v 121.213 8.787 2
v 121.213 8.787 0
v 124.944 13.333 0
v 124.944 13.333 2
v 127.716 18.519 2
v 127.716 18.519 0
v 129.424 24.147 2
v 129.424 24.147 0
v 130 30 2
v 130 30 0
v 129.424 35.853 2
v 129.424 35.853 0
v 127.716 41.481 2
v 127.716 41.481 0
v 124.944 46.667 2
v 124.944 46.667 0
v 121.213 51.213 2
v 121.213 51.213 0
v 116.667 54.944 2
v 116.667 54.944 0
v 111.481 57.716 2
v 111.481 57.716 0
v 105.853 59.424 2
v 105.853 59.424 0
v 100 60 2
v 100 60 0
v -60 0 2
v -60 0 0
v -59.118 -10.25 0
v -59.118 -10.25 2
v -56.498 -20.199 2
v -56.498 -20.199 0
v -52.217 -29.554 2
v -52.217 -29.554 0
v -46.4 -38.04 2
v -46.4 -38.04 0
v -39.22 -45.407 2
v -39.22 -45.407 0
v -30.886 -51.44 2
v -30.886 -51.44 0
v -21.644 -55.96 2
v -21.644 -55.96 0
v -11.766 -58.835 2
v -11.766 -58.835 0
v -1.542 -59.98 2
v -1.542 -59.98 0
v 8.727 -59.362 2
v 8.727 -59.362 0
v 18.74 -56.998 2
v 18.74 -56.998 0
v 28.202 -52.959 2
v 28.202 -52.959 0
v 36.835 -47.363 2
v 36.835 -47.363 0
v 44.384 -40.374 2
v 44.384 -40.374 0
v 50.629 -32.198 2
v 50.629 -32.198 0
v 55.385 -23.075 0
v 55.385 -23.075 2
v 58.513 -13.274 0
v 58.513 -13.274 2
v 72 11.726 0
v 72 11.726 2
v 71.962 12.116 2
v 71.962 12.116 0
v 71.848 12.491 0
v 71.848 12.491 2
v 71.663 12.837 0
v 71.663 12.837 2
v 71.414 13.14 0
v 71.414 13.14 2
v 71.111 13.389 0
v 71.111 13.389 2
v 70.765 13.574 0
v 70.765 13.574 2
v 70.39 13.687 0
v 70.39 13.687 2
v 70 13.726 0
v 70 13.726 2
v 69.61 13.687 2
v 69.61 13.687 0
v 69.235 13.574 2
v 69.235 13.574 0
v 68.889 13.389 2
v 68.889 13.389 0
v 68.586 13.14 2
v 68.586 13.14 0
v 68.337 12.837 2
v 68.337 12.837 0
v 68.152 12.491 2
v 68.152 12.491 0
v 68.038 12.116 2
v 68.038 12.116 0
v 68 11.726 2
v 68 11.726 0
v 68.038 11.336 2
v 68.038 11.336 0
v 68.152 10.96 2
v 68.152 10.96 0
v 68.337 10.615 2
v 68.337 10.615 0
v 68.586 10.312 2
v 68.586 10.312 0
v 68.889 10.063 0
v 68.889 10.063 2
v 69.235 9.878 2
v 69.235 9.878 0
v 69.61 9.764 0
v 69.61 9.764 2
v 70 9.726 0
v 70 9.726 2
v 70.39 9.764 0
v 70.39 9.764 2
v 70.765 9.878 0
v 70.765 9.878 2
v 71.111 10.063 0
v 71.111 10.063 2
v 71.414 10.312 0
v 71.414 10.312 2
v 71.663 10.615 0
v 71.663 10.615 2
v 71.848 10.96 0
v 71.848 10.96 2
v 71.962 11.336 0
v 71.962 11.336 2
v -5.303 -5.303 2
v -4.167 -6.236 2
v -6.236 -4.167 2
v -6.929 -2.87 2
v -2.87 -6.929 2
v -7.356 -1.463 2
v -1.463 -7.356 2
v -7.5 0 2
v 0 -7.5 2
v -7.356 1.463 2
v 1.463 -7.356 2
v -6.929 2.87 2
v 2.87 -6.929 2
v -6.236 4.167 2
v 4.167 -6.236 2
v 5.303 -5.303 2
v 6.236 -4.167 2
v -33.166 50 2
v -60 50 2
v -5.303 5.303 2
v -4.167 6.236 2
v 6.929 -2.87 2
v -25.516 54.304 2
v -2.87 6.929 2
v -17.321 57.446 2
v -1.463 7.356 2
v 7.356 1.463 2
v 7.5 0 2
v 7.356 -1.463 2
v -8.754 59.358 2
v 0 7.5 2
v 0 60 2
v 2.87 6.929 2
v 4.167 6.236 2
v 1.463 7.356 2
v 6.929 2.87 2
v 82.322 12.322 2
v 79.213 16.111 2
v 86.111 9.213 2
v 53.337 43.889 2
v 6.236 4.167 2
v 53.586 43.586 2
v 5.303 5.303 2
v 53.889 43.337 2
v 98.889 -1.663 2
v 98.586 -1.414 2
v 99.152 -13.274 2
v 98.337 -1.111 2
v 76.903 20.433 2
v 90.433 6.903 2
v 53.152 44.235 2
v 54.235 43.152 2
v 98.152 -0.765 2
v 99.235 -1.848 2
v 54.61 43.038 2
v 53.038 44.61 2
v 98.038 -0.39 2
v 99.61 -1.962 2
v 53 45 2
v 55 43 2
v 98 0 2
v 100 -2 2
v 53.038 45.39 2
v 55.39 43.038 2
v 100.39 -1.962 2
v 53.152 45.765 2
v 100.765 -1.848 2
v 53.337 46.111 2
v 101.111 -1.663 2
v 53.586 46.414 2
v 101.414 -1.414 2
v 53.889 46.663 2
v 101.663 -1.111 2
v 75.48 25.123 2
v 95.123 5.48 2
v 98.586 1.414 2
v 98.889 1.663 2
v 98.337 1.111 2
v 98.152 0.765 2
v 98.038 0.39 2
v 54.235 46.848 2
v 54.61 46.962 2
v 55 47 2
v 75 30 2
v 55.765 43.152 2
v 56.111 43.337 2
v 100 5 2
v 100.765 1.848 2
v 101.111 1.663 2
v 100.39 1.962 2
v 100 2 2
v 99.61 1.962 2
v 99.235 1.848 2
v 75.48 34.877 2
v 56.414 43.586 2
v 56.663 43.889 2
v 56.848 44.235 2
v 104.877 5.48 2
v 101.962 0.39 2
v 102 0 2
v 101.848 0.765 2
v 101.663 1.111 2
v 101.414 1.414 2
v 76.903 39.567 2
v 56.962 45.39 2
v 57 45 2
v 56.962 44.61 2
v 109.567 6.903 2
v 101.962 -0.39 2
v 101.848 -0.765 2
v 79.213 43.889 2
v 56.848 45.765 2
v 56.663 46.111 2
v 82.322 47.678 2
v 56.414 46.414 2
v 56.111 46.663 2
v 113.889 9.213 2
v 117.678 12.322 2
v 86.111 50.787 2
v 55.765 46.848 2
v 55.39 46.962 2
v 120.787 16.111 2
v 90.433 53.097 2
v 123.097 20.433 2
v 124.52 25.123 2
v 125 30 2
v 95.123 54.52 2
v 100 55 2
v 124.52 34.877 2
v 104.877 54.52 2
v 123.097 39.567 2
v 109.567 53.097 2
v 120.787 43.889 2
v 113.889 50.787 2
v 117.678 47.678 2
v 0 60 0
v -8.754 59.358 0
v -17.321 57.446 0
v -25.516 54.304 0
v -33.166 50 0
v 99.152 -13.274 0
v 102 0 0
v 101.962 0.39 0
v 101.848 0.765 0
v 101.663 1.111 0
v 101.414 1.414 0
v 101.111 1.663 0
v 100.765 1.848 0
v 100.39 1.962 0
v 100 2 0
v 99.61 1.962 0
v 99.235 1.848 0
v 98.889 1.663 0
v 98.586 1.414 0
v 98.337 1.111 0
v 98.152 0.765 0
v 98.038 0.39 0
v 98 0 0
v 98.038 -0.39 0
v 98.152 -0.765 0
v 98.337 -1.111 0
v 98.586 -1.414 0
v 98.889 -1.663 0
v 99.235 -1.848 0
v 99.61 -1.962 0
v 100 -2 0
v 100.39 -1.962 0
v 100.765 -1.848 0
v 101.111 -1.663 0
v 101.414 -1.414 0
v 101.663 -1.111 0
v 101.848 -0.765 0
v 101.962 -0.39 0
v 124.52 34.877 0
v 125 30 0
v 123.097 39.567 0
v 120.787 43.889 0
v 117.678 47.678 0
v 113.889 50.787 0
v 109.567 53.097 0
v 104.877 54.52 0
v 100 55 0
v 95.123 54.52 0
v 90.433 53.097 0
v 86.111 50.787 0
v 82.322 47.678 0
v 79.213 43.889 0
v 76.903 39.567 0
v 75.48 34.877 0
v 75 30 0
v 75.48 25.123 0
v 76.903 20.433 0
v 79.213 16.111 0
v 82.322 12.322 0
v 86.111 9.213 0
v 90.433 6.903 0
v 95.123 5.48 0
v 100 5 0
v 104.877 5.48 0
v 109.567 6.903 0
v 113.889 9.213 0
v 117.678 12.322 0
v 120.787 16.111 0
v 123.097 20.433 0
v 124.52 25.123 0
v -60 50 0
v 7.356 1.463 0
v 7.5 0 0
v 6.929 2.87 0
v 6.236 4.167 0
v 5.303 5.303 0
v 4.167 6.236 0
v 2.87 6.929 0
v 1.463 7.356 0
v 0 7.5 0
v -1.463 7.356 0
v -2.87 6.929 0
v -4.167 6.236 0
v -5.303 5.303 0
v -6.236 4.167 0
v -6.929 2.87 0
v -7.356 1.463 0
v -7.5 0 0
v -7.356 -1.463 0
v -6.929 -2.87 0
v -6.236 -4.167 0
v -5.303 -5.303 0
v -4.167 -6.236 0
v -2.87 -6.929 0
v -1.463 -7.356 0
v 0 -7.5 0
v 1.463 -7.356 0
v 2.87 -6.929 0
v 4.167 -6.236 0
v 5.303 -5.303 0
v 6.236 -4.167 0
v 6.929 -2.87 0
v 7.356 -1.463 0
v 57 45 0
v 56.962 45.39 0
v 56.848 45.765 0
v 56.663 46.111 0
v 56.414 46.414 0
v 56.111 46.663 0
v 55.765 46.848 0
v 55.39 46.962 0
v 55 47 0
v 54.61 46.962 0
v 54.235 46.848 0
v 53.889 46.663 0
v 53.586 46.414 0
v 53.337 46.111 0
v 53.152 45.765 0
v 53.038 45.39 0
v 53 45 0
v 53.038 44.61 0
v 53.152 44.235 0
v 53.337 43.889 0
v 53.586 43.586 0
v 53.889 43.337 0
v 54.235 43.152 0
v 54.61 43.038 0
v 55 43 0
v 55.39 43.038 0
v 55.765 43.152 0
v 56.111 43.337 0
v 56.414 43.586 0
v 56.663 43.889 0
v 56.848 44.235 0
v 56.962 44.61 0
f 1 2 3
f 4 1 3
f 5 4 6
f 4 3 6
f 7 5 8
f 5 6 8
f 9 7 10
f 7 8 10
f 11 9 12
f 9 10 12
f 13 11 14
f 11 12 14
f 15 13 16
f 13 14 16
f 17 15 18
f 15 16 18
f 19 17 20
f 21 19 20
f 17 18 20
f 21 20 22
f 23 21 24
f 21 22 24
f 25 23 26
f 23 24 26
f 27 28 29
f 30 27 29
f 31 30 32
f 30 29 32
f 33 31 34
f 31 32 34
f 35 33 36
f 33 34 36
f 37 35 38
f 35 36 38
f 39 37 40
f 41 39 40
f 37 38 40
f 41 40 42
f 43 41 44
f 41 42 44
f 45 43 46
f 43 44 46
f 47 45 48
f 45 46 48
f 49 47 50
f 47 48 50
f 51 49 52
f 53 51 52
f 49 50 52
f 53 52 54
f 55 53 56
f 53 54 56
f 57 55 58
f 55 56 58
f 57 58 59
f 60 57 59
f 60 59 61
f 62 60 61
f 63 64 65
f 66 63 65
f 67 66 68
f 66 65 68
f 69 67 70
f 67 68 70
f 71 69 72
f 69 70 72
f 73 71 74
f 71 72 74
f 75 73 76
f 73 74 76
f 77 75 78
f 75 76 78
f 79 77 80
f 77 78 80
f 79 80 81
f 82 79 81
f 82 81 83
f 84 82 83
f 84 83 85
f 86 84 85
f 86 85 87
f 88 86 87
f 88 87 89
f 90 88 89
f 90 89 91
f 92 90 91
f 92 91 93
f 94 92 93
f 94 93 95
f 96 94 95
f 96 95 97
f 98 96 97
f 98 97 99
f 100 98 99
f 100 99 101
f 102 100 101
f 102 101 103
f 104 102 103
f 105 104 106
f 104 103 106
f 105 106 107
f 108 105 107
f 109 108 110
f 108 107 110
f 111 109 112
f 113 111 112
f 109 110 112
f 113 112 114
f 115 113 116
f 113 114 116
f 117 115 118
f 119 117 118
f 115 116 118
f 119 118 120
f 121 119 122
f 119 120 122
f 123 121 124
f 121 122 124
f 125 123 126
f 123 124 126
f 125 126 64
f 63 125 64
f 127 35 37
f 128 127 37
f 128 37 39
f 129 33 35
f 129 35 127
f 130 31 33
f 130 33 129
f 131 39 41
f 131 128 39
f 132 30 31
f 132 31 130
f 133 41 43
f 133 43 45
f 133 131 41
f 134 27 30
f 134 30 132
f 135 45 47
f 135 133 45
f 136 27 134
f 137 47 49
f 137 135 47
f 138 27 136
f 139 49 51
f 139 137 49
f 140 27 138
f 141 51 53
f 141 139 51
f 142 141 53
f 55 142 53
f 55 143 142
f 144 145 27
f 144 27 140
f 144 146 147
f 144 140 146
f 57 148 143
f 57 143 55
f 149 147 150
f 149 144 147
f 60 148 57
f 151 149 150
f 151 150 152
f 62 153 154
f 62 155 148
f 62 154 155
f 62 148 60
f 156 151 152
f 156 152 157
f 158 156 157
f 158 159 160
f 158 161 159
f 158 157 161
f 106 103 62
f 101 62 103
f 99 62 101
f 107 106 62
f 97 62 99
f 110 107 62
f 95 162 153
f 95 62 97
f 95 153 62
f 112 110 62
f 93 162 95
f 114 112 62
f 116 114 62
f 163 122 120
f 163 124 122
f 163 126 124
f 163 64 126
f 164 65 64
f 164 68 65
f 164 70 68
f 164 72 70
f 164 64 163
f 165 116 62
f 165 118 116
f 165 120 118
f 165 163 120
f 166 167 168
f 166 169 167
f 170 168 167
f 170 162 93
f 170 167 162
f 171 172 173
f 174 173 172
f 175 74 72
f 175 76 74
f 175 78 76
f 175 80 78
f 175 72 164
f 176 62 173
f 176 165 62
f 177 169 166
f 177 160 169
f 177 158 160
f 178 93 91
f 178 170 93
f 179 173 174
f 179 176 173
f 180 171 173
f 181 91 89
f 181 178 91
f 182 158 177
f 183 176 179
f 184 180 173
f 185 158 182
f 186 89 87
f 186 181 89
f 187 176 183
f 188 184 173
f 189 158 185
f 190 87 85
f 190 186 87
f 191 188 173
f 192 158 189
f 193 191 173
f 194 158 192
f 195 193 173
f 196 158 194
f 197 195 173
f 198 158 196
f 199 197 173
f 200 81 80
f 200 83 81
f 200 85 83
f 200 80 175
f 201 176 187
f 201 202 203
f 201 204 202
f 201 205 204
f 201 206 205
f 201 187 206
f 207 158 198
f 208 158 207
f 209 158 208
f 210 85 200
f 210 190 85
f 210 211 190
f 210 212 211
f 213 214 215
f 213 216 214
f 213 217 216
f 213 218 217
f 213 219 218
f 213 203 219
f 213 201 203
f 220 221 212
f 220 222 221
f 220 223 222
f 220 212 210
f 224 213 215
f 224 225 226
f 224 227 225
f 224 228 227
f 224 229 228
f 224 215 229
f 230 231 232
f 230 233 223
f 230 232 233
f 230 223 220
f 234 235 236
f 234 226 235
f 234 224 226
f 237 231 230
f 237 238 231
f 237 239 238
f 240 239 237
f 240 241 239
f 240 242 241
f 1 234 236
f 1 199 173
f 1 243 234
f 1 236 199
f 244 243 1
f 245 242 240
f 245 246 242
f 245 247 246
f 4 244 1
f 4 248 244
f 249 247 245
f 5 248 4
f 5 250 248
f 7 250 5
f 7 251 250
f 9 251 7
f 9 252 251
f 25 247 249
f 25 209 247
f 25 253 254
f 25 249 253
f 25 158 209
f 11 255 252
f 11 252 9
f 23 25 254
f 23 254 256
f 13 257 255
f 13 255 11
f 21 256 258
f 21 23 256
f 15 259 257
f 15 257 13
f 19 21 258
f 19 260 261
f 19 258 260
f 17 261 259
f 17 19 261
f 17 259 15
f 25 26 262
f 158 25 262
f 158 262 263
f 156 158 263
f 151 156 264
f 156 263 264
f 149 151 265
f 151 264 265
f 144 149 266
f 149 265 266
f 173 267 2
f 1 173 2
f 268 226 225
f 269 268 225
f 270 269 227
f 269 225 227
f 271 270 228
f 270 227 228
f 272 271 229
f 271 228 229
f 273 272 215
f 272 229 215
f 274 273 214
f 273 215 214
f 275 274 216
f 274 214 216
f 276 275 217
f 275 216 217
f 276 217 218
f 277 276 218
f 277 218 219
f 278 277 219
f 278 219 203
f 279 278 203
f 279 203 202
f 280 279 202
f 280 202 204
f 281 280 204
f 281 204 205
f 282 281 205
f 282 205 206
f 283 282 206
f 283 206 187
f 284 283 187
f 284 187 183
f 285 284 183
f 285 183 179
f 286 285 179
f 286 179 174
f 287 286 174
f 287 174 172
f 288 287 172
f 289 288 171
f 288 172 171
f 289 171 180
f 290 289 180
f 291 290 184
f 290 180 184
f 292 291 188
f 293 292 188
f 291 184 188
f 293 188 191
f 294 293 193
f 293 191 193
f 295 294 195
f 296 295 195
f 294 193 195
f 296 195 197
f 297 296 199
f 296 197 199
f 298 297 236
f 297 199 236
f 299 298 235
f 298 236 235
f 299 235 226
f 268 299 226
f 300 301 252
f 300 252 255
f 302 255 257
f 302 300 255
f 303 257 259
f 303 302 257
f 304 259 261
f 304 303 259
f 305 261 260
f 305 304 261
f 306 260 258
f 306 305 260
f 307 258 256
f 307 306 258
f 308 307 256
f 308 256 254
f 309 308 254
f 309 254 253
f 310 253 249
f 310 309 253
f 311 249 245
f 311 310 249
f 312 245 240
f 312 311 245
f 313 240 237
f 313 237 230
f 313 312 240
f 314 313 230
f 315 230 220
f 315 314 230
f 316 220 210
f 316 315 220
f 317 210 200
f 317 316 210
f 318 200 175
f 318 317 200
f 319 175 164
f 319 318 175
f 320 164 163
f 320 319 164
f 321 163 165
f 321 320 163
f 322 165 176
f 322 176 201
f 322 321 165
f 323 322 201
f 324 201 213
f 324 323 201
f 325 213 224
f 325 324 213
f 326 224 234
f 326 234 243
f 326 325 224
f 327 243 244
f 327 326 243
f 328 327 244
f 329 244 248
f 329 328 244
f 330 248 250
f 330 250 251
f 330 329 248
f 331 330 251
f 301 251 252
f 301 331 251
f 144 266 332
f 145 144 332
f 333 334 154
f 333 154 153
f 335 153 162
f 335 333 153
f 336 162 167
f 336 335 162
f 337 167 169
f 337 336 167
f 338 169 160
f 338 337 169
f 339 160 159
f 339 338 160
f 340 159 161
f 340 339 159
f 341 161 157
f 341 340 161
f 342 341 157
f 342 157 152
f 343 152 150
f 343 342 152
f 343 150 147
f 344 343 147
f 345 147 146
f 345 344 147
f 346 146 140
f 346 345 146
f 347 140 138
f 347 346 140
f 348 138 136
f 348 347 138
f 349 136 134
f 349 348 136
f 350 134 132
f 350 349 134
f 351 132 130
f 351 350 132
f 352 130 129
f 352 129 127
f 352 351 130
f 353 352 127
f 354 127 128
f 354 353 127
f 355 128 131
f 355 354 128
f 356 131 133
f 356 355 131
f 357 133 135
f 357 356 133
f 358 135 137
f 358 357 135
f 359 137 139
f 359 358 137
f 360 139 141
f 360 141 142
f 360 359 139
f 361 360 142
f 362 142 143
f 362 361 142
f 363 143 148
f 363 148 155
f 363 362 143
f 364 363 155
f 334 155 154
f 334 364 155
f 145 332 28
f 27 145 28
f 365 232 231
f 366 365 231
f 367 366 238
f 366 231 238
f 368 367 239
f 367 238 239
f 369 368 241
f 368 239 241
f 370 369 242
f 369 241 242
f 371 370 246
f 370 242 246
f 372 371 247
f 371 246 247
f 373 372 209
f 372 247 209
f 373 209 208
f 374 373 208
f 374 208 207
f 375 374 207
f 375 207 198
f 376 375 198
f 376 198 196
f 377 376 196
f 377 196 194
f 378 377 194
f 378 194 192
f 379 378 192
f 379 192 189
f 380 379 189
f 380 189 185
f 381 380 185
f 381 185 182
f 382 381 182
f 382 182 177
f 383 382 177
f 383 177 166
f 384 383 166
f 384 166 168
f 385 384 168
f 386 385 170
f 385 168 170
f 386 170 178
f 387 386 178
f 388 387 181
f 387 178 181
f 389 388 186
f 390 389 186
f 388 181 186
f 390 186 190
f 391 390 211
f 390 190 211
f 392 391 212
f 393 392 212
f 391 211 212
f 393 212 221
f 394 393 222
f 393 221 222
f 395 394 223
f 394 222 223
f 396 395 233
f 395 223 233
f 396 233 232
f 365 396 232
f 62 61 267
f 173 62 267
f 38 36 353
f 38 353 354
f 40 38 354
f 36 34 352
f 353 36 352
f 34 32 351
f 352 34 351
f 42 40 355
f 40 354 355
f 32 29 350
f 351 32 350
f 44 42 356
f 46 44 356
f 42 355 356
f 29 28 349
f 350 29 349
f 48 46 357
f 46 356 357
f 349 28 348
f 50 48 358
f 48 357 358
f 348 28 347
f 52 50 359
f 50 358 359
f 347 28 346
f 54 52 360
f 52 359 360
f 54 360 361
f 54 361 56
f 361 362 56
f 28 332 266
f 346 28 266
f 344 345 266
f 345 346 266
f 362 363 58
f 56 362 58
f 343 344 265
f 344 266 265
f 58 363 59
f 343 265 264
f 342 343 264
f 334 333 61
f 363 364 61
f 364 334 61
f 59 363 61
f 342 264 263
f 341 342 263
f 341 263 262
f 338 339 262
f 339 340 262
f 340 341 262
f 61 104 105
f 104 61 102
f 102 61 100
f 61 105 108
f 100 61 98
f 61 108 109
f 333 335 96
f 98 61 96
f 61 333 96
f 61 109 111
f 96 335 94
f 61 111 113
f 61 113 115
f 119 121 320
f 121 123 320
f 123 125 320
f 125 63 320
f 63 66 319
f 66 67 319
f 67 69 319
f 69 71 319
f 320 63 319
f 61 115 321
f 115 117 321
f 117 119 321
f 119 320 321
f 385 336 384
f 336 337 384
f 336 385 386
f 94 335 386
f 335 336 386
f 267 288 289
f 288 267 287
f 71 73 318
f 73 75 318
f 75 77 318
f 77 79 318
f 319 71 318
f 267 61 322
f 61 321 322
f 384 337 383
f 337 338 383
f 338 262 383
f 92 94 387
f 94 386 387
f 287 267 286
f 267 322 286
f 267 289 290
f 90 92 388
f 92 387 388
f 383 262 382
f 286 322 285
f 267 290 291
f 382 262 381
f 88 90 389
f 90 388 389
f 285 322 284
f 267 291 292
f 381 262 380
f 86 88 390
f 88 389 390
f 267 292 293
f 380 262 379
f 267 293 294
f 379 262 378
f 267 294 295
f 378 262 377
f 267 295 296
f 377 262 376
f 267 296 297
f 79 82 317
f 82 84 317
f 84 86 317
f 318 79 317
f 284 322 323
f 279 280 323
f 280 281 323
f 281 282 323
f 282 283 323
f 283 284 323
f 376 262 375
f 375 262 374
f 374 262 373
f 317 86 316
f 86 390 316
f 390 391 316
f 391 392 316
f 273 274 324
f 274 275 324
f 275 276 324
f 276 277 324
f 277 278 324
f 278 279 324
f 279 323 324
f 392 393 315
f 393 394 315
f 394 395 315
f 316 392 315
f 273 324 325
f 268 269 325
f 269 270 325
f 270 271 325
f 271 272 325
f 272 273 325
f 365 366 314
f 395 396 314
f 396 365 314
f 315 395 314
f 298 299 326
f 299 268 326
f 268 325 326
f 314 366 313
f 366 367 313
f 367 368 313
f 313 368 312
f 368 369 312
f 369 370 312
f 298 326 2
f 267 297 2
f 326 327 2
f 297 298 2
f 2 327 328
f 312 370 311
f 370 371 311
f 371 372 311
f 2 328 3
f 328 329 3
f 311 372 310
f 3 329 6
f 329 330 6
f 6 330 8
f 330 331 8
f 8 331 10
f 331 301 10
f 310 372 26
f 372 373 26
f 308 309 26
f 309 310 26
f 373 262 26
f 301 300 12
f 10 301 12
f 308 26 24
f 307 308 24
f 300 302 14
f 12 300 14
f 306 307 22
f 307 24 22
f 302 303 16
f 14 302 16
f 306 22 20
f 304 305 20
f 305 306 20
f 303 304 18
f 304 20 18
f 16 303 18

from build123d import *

# Parameters (mm, degrees)
SKETCH1_R           = 7.5
SKETCH1_R_2         = 25
BOSS_EXTRUDE1_DEPTH = 2
CUT_EXTRUDE1_REACH  = 145.192
SKETCH2_R           = 2
SKETCH3_R           = 2
CUT_EXTRUDE2_DEPTH  = 10


with BuildPart() as part:
    # Sketch1 → Boss-Extrude1 (new body)
    # profile 1 of 2: a face of its own
    with BuildSketch(Plane.XY):
        with BuildLine():
            ThreePointArc((-60, 0), (-52.867640737, 28.372743309), (-33.166247904, 50))
            Line((-33.166247904, 50), (-60, 50))
            Line((-60, 50), (-60, 0))
        make_face()
    # profile 2 of 2: a face of its own
    with BuildSketch(Plane.XY):
        with BuildLine():
            ThreePointArc((0, 60), (-17.320508076, 57.445626465), (-33.166247904, 50))
            ThreePointArc((-33.166247904, 50), (-52.867640737, 28.372743309), (-60, 0))
            ThreePointArc((-60, 0), (-6.678621673, -59.627141576), (58.513200418, -13.274237334))
            Line((58.513200418, -13.274237334), (99.152169538, -13.274237334))
            Line((99.152169538, -13.274237334), (121.213203436, 8.786796564))
            ThreePointArc((121.213203436, 8.786796564), (127.716385975, 41.480502971), (100, 60))
            Line((100, 60), (0, 60))
        make_face()
        Circle(SKETCH1_R, mode=Mode.SUBTRACT)
        with Locations((100, 30)):
            Circle(SKETCH1_R_2, mode=Mode.SUBTRACT)
    extrude(amount=BOSS_EXTRUDE1_DEPTH)

    # Sketch2 → Cut-Extrude1 (cut, up to next)
    with BuildSketch(Plane.XY.offset(2), mode=Mode.PRIVATE) as cut_extrude1_sk1:
        with Locations((55, 45)):
            Circle(SKETCH2_R)
    cut_extrude1_tool1 = extrude(cut_extrude1_sk1.sketch, amount=-CUT_EXTRUDE1_REACH, mode=Mode.PRIVATE) & part.part
    # Sketch2 → Cut-Extrude1 (cut, up to next)
    with BuildSketch(Plane.XY.offset(2), mode=Mode.PRIVATE) as cut_extrude1_sk2:
        with Locations((70, 11.725762666)):
            Circle(SKETCH2_R)
    cut_extrude1_tool2 = extrude(cut_extrude1_sk2.sketch, amount=-CUT_EXTRUDE1_REACH, mode=Mode.PRIVATE) & part.part
    add(cut_extrude1_tool1.solids().sort_by_distance((55, 45, 2))[0], mode=Mode.SUBTRACT)
    add(cut_extrude1_tool2.solids().sort_by_distance((70, 11.725763, 2))[0], mode=Mode.SUBTRACT)

    # Sketch3 → Cut-Extrude2 (cut)
    with BuildSketch(Plane.XY.offset(2)):
        with Locations((100, 0)):
            Circle(SKETCH3_R)
    extrude(amount=-CUT_EXTRUDE2_DEPTH, mode=Mode.SUBTRACT)


solid = part.part
